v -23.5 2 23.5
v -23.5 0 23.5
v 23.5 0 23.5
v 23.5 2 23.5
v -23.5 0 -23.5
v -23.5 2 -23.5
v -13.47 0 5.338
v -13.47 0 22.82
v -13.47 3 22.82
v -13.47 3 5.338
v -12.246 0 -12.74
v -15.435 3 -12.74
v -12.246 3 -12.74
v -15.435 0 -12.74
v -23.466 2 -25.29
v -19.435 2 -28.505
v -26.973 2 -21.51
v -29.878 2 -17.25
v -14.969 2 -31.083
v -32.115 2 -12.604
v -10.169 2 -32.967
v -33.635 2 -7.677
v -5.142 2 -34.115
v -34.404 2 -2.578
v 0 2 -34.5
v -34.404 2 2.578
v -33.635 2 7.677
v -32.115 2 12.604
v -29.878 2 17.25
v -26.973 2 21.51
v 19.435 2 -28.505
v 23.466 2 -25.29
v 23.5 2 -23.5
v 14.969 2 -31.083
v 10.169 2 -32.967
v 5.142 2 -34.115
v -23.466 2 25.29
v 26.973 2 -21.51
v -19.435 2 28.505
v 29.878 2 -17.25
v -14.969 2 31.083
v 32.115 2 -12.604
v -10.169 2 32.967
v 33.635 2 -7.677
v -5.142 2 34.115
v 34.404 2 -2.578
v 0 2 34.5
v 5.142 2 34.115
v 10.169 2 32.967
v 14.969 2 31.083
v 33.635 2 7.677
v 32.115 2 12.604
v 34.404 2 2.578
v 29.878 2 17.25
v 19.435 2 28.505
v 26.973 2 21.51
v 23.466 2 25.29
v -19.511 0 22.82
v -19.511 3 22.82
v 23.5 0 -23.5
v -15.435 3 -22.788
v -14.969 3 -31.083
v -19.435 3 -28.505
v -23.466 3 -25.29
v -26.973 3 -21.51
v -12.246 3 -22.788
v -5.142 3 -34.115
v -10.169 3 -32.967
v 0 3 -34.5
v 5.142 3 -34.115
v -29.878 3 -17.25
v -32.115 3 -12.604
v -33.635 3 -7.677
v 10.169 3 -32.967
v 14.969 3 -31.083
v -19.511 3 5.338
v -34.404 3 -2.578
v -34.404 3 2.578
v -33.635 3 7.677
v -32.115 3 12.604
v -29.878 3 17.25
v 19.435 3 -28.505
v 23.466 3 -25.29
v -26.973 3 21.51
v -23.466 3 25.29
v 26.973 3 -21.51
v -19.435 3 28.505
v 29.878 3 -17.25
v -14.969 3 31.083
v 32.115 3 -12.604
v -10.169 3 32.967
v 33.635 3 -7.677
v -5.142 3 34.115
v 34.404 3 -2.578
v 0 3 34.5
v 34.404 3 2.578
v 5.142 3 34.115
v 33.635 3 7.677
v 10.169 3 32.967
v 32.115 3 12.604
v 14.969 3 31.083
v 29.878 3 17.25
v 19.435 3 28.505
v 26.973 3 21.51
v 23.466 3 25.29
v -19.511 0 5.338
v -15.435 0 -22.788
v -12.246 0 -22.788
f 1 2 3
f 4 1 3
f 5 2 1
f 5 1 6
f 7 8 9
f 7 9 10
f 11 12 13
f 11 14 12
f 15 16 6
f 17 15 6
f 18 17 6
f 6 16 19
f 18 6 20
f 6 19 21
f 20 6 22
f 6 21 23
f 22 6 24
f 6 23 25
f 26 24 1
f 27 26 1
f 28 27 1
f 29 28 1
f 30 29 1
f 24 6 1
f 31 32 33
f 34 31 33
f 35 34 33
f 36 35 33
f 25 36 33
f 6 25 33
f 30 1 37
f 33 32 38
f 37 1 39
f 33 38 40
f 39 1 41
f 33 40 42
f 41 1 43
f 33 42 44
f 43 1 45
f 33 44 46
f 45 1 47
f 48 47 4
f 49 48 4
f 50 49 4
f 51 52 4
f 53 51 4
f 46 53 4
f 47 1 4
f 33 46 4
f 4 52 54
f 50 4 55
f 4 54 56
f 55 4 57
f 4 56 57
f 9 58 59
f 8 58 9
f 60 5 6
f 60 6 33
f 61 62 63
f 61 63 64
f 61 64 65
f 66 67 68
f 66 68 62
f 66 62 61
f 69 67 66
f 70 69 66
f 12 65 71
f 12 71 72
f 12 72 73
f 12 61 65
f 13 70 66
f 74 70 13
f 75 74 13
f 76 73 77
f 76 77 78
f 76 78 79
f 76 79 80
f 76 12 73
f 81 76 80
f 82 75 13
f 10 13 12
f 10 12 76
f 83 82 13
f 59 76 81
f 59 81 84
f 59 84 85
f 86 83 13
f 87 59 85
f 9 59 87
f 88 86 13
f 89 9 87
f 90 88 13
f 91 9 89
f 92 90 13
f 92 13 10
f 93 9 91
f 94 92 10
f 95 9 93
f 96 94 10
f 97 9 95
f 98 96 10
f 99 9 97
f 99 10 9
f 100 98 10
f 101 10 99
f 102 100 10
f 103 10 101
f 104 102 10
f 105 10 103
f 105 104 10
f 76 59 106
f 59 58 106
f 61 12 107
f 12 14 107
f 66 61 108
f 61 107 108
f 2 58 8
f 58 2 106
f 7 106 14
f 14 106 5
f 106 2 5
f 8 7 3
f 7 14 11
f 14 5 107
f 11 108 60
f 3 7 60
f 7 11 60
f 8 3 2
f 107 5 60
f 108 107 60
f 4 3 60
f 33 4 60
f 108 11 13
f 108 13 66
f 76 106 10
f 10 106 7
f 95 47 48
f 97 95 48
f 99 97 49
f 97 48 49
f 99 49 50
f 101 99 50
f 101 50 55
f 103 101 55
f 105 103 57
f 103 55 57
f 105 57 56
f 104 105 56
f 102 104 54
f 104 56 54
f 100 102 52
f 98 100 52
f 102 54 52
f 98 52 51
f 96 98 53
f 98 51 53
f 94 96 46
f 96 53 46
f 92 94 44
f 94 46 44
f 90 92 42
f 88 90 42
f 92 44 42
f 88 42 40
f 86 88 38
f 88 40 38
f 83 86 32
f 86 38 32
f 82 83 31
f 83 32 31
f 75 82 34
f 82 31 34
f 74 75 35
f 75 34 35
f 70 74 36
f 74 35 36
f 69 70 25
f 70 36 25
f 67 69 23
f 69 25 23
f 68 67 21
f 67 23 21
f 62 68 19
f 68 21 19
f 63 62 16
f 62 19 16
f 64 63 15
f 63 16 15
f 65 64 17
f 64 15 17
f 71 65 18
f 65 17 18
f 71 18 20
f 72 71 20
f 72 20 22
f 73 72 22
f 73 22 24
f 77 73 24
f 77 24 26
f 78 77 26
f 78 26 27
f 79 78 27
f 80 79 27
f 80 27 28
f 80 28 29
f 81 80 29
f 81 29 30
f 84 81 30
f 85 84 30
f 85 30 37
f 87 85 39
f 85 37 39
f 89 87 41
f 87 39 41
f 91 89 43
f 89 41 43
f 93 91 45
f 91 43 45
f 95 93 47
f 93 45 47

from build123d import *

# Parameters (mm, degrees)
SKETCH1_W           = 47
SKETCH1_H           = 47
SKETCH1_W_2         = 6.040926981
SKETCH1_H_2         = 17.482076569
SKETCH1_W_3         = 3.189765803
SKETCH1_H_3         = 10.04776228
BOSS_EXTRUDE2_DEPTH = 2
SKETCH6_R           = 34.5
SKETCH6_W           = 3.189765803
SKETCH6_H           = 10.04776228
SKETCH6_W_2         = 6.040926981
SKETCH6_H_2         = 17.482076569
BOSS_EXTRUDE4_DEPTH = 1


with BuildPart() as part:
    # Sketch1 → Boss-Extrude2 (new body)
    with BuildSketch(Plane(origin=(0, 0, 0), x_dir=(1, 0, 0), z_dir=(0, 1, 0))):
        Rectangle(SKETCH1_W, SKETCH1_H)
        with Locations((-16.490815369, -14.078790897)):
            Rectangle(SKETCH1_W_2, SKETCH1_H_2, mode=Mode.SUBTRACT)
        with Locations((-13.840536858, 17.764090865)):
            Rectangle(SKETCH1_W_3, SKETCH1_H_3, mode=Mode.SUBTRACT)
    extrude(amount=BOSS_EXTRUDE2_DEPTH)

    # Sketch6 → Boss-Extrude4 (add)
    with BuildSketch(Plane(origin=(0, 2, 0), x_dir=(1, 0, 0), z_dir=(0, 1, 0))):
        with Locations(Location((0, 0, 0), (0, 0, 270))):
            Circle(SKETCH6_R)
        with Locations((-13.840536858, 17.764090865)):
            Rectangle(SKETCH6_W, SKETCH6_H, mode=Mode.SUBTRACT)
        with Locations((-16.490815369, -14.078790897)):
            Rectangle(SKETCH6_W_2, SKETCH6_H_2, mode=Mode.SUBTRACT)
    extrude(amount=BOSS_EXTRUDE4_DEPTH)


solid = part.part
